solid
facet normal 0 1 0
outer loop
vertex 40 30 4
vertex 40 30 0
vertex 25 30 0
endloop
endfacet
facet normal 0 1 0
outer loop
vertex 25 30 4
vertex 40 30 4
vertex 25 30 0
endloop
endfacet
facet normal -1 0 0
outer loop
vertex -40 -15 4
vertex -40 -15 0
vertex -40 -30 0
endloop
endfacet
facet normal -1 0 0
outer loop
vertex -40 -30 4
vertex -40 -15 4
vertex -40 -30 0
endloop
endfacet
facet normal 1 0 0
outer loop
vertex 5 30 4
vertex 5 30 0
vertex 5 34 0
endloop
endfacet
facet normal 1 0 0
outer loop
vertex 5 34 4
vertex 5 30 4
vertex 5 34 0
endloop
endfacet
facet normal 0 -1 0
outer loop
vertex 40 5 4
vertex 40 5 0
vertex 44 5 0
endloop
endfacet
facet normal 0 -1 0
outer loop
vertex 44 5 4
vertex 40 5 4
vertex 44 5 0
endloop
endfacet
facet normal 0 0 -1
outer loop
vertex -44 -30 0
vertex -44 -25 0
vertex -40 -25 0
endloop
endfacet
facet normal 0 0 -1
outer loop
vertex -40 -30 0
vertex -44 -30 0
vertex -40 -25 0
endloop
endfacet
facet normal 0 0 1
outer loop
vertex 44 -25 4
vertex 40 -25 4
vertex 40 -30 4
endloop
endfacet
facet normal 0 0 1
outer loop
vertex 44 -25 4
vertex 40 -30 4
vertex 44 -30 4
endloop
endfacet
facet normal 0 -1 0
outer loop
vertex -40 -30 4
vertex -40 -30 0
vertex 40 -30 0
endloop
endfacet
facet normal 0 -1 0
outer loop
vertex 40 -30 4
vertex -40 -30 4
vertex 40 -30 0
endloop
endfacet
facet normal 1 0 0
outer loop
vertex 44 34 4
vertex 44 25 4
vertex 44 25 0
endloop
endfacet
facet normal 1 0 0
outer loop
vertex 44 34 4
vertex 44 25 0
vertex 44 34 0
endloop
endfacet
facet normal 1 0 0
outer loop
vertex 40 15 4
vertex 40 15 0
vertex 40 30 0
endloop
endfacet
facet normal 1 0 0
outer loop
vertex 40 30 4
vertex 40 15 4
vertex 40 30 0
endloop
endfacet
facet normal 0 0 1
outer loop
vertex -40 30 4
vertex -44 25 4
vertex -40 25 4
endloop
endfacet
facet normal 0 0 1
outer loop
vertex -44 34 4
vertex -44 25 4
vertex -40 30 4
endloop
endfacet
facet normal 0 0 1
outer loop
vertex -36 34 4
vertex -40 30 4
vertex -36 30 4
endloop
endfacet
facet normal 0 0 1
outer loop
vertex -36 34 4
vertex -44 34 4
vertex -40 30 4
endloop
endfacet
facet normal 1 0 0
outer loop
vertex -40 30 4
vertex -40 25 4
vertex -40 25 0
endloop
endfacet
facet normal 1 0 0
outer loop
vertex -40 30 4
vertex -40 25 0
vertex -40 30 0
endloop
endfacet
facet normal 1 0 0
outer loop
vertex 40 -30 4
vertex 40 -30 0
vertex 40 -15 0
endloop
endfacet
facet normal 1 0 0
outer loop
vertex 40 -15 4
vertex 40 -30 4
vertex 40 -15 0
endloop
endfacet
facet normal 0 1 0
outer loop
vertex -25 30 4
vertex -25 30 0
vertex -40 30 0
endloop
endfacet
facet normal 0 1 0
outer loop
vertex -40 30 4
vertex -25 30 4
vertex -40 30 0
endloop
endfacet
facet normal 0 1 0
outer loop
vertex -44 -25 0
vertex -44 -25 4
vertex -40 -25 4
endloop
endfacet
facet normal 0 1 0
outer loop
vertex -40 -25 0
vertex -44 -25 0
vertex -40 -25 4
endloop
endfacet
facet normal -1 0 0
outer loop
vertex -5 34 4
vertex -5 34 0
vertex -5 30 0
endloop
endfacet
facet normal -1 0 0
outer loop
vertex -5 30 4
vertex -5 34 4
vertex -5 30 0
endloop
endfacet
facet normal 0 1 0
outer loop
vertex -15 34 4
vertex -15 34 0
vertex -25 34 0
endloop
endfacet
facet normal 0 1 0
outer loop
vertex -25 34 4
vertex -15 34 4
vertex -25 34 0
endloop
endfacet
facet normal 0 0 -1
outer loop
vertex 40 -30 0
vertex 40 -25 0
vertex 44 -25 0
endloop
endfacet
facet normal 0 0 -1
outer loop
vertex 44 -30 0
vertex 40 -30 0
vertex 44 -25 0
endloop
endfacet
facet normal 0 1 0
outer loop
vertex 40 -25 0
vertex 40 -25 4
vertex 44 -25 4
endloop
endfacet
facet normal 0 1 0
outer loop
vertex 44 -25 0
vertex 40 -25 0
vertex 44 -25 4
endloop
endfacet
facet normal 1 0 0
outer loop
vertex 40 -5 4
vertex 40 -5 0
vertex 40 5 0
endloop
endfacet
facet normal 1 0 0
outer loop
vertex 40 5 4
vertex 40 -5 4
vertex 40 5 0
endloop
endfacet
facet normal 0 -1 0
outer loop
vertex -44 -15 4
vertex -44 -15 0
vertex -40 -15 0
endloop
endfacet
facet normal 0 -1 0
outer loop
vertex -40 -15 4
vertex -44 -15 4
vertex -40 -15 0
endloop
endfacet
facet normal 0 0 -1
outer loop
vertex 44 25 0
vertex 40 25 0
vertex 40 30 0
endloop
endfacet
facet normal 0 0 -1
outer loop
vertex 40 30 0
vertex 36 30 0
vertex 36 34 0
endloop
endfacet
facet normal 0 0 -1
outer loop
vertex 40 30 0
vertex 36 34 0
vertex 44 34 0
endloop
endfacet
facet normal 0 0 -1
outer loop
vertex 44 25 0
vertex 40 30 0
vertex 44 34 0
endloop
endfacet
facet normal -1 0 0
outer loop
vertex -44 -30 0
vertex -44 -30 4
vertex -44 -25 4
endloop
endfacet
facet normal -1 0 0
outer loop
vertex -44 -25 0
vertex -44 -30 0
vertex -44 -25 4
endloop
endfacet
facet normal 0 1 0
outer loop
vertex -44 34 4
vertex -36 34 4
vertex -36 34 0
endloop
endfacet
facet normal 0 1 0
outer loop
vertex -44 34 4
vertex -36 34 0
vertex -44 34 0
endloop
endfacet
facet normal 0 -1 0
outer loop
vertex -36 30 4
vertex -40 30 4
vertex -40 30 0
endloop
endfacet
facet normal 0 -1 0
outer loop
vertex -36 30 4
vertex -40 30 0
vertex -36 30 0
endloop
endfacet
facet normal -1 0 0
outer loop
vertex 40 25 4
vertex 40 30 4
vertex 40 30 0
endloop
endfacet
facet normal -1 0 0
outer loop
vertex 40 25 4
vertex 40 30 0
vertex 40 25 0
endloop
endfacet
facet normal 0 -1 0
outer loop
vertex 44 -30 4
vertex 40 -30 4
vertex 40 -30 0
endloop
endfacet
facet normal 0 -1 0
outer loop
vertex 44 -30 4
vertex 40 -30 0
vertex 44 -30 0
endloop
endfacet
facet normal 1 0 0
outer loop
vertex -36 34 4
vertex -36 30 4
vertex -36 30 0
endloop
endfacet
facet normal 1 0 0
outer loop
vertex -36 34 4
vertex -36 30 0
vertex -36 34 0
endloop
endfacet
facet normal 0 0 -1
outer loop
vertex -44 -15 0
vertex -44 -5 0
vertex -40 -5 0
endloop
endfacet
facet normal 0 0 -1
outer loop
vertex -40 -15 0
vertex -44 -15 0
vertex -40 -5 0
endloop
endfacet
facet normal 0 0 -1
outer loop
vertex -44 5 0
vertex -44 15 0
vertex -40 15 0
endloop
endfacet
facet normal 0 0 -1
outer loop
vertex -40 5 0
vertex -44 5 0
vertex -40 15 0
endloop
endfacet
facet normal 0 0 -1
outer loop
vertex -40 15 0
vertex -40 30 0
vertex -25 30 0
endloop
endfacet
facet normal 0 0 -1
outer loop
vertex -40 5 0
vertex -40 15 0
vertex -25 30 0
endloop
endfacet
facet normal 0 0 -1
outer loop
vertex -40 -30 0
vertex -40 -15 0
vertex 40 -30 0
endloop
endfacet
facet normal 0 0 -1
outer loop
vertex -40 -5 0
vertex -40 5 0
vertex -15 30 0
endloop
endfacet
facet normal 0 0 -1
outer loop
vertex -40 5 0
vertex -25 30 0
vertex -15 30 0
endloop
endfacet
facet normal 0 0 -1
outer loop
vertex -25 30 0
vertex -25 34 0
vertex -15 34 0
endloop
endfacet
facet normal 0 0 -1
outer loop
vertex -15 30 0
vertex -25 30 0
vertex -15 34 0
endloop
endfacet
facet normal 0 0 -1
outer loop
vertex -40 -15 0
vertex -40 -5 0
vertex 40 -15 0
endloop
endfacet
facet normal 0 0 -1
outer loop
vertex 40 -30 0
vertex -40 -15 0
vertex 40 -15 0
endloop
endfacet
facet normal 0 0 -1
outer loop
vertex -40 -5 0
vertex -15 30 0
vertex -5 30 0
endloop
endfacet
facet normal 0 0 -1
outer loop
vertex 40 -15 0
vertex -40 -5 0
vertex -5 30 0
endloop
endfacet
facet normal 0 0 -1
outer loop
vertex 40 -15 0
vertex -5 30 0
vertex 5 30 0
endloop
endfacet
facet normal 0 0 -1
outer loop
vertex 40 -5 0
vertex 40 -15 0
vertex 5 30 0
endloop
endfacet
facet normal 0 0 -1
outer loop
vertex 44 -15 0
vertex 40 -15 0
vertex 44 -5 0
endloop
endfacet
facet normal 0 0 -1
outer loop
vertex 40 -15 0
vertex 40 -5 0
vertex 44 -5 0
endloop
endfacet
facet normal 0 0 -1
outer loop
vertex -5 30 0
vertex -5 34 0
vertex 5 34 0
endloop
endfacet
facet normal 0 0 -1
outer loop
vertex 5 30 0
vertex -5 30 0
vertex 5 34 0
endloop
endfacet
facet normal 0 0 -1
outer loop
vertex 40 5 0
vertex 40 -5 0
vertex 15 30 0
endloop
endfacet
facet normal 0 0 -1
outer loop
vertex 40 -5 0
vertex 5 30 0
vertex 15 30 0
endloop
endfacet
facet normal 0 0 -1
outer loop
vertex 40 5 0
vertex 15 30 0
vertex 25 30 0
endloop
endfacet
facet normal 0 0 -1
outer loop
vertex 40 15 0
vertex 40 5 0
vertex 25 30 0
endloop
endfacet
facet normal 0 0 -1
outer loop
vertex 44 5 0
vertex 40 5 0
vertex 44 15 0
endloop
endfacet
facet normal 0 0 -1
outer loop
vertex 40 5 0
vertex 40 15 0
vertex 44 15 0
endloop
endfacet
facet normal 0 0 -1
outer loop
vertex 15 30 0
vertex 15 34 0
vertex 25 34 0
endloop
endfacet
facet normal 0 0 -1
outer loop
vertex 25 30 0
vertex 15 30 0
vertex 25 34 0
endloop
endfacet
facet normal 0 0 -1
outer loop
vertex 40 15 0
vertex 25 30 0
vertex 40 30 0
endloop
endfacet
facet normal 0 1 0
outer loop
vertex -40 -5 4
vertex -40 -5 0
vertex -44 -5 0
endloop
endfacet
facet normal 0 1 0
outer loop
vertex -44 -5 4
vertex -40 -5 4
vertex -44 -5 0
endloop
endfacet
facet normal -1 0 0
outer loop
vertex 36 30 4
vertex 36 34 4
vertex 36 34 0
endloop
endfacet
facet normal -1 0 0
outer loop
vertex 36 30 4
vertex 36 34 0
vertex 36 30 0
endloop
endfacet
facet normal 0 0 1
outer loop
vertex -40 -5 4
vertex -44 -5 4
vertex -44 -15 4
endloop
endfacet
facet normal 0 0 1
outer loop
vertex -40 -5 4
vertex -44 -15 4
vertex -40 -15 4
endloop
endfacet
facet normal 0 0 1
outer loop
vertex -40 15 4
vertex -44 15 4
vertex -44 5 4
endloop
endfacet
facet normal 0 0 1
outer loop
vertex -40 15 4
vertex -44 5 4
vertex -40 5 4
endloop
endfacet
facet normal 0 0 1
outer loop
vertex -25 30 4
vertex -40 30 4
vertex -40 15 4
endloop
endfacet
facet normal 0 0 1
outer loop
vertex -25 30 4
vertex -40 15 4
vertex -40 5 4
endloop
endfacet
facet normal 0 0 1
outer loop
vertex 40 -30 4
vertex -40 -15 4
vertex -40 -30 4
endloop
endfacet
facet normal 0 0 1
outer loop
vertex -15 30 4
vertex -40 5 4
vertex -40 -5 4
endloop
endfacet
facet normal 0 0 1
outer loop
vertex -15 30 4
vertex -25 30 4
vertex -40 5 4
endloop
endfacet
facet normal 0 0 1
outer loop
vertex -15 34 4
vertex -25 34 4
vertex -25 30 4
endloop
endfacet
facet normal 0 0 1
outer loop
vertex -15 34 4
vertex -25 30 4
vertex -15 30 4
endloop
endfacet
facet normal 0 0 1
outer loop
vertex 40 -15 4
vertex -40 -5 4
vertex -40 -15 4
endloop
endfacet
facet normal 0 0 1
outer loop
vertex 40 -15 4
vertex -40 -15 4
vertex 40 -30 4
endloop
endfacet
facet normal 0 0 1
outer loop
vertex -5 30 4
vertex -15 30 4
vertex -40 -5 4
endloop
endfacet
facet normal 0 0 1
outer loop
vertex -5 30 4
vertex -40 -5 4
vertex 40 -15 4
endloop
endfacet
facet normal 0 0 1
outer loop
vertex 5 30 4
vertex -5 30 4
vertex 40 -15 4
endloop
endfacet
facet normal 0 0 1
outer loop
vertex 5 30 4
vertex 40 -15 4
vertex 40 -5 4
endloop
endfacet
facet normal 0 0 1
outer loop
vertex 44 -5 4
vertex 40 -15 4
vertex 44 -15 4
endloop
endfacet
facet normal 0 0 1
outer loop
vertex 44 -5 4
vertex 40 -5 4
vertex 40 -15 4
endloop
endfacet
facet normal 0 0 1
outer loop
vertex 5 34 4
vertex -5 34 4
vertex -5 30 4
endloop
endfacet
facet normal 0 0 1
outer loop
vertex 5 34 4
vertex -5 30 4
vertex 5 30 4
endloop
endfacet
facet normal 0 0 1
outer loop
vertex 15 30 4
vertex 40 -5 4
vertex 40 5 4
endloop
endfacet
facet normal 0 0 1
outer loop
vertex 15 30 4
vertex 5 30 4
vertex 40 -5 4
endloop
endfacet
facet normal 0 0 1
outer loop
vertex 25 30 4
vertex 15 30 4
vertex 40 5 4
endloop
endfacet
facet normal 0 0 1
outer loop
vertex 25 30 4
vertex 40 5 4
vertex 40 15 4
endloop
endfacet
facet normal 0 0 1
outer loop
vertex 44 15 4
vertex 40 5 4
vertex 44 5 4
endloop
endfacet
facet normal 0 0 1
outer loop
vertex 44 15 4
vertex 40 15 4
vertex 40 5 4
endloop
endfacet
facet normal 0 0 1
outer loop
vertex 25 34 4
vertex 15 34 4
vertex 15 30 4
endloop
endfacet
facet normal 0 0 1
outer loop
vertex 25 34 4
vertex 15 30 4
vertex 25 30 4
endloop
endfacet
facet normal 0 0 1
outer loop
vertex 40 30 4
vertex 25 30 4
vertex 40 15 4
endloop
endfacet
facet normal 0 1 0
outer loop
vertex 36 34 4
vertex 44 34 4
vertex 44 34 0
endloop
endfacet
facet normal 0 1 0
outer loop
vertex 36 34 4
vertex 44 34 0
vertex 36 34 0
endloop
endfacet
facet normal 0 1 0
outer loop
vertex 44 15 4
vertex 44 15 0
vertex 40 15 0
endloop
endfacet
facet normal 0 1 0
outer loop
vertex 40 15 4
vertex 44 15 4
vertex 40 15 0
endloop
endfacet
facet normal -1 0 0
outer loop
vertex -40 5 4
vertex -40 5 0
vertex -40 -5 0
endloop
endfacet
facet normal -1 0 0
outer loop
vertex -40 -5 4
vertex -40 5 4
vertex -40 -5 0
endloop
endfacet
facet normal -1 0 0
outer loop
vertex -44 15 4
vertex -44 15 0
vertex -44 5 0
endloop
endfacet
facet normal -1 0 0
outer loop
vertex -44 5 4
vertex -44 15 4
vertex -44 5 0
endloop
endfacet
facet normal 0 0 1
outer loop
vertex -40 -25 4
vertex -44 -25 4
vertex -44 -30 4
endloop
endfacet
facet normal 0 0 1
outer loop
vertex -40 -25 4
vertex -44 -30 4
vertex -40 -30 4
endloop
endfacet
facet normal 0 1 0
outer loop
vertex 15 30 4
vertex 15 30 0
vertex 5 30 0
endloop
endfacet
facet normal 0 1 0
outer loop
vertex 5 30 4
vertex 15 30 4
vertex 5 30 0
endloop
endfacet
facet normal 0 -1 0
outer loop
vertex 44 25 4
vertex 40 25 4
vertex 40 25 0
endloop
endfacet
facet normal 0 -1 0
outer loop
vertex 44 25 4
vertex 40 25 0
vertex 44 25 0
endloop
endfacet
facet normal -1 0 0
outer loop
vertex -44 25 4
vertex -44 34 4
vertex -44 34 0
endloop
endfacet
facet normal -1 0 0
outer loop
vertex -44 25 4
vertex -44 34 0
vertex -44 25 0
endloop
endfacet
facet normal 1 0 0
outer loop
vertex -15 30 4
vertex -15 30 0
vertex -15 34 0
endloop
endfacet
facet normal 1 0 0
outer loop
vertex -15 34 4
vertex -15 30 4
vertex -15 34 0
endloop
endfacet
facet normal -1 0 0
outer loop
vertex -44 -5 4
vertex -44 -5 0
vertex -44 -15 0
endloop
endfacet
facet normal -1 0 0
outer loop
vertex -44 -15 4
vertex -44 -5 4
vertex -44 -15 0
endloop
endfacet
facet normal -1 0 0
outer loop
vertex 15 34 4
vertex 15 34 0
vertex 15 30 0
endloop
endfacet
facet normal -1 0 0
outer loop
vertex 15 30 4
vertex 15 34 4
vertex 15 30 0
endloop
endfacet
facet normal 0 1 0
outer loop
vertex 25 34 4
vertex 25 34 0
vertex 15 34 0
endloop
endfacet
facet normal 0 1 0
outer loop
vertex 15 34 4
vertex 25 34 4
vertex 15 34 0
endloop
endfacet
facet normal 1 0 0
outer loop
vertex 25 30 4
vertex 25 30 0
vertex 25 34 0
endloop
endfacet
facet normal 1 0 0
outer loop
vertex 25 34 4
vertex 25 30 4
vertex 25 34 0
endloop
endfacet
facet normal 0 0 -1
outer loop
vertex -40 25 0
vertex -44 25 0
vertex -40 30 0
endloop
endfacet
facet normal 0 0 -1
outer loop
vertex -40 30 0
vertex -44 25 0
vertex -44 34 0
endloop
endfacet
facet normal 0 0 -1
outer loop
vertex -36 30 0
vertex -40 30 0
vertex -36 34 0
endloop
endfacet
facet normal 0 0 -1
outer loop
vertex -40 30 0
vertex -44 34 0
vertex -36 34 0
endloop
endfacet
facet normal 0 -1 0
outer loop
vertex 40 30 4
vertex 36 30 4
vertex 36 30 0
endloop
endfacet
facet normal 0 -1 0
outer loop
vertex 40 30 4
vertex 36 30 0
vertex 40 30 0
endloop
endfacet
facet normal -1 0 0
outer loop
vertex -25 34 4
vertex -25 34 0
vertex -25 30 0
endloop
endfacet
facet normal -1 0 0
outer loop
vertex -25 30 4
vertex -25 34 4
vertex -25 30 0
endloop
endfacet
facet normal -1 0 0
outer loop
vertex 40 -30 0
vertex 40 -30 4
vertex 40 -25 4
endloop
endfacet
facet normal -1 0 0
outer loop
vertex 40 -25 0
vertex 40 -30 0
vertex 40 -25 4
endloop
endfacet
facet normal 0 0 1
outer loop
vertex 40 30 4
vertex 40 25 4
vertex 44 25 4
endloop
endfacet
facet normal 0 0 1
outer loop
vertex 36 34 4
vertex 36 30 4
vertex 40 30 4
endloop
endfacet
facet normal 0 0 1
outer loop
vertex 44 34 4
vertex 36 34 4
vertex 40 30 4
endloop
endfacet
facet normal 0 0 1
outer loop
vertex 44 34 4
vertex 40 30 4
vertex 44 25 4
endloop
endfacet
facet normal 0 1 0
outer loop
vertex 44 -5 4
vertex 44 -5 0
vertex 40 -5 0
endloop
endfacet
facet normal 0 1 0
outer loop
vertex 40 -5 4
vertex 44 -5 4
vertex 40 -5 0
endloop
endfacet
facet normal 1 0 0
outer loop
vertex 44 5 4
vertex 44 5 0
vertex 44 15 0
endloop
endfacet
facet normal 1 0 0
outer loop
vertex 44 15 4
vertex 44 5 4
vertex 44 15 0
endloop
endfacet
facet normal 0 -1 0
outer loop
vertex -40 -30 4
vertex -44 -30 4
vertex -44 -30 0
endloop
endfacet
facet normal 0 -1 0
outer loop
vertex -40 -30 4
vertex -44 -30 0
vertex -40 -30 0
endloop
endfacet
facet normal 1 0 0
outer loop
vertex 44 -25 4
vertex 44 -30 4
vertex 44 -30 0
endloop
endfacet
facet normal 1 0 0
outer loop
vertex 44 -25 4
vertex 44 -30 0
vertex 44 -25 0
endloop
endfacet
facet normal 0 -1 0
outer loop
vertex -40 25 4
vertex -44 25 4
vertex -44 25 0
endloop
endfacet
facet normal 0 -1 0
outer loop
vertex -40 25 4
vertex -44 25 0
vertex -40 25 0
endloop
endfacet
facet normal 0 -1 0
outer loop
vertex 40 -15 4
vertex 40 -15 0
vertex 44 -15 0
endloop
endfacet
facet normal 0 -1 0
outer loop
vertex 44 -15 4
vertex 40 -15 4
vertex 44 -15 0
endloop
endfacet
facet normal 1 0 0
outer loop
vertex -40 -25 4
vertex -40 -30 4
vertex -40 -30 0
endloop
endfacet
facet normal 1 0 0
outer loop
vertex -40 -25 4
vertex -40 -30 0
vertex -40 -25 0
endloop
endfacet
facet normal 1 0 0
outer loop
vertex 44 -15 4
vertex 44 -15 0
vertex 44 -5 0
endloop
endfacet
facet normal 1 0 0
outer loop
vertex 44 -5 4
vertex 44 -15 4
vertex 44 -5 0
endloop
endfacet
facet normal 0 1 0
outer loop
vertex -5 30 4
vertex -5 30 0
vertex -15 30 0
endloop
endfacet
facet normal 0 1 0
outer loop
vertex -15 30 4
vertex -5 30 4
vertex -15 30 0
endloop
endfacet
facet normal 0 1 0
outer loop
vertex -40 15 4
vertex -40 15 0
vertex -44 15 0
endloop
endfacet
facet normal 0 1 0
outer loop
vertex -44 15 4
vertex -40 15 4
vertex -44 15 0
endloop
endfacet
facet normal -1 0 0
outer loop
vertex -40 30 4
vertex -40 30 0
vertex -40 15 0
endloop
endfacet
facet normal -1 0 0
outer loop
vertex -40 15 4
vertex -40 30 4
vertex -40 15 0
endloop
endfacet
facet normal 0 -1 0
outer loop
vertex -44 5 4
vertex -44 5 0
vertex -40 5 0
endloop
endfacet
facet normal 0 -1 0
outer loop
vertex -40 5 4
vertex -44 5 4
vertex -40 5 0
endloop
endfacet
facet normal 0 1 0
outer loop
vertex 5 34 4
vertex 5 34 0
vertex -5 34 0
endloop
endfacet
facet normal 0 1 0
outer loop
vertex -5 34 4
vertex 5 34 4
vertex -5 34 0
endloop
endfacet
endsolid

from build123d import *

# Parameters (mm, degrees)
SKETCH1_W             = 4
SKETCH1_H             = 5
BOSS_EXTRUDE1_DEPTH   = 4
BOSS_EXTRUDE2_DEPTH   = 4
BOSS_EXTRUDE2_2_DEPTH = 4
SKETCH2_W             = 4
SKETCH2_H             = 5
BOSS_EXTRUDE2_3_DEPTH = 4
BOSS_EXTRUDE2_4_DEPTH = 4


with BuildPart() as part:
    # Sketch1 → Boss-Extrude1 (new body)
    with BuildSketch(Plane.XY):
        Polygon((-25, 30), (-36, 30), (-36, 25), (-40, 25), (-40, 15), (-36, 15), (-36, 5), (-40, 5), (-40, -5), (-36, -5), (-36, -15), (-40, -15), (-40, -25), (-36, -25), (-36, -30), (36, -30), (36, -25), (40, -25), (40, -15), (36, -15), (36, -5), (40, -5), (40, 5), (36, 5), (36, 15), (40, 15), (40, 25), (36, 25), (36, 30), (25, 30), (25, 26), (15, 26), (15, 30), (5, 30), (5, 26), (-5, 26), (-5, 30), (-15, 30), (-15, 26), (-25, 26), align=None)
        Polygon((-36, 15), (-40, 15), (-40, 10), (-40, 5), (-36, 5), align=None)
        Polygon((-40, 10), (-40, 15), (-44, 15), (-44, 5), (-40, 5), align=None)
        Polygon((-36, -5), (-40, -5), (-40, -10), (-40, -15), (-36, -15), align=None)
        Polygon((-40, -10), (-40, -5), (-44, -5), (-44, -15), (-40, -15), align=None)
        with Locations((-38, -27.5)):
            Rectangle(SKETCH1_W, SKETCH1_H)
        with Locations((38, -27.5)):
            Rectangle(SKETCH1_W, SKETCH1_H)
        Polygon((36, -15), (40, -15), (40, -10), (40, -5), (36, -5), align=None)
        Polygon((40, -10), (40, -15), (44, -15), (44, -5), (40, -5), align=None)
        Polygon((40, 10), (40, 15), (36, 15), (36, 5), (40, 5), align=None)
        Polygon((44, 15), (40, 15), (40, 10), (40, 5), (44, 5), align=None)
        with Locations((38, 27.5)):
            Rectangle(SKETCH1_W, SKETCH1_H)
        Polygon((20, 30), (15, 30), (15, 26), (25, 26), (25, 30), align=None)
        Polygon((15, 34), (15, 30), (20, 30), (25, 30), (25, 34), align=None)
        Polygon((0, 30), (-5, 30), (-5, 26), (5, 26), (5, 30), align=None)
        Polygon((-5, 34), (-5, 30), (0, 30), (5, 30), (5, 34), align=None)
        with Locations((-38, 27.5)):
            Rectangle(SKETCH1_W, SKETCH1_H)
        Polygon((-20, 30), (-25, 30), (-25, 26), (-15, 26), (-15, 30), align=None)
        Polygon((-25, 34), (-25, 30), (-20, 30), (-15, 30), (-15, 34), align=None)
    extrude(amount=BOSS_EXTRUDE1_DEPTH)


with BuildPart() as body_2:
    # Sketch2 → Boss-Extrude2 (new body)
    with BuildSketch(Plane.XY.offset(4)):
        Polygon((-44, 34), (-44, 25), (-40, 25), (-40, 30), (-36, 30), (-36, 34), align=None)
    extrude(amount=-BOSS_EXTRUDE2_DEPTH)


with BuildPart() as body_3:
    # Sketch2 → Boss-Extrude2 2 (new body)
    with BuildSketch(Plane.XY.offset(4)):
        Polygon((40, 30), (40, 25), (44, 25), (44, 34), (36, 34), (36, 30), align=None)
    extrude(amount=-BOSS_EXTRUDE2_2_DEPTH)


with BuildPart() as body_4:
    # Sketch2 → Boss-Extrude2 3 (new body)
    with BuildSketch(Plane.XY.offset(4)):
        with Locations((42, -27.5)):
            Rectangle(SKETCH2_W, SKETCH2_H)
    extrude(amount=-BOSS_EXTRUDE2_3_DEPTH)


with BuildPart() as body_5:
    # Sketch2 → Boss-Extrude2 4 (new body)
    with BuildSketch(Plane.XY.offset(4)):
        with Locations((-42, -27.5)):
            Rectangle(SKETCH2_W, SKETCH2_H)
    extrude(amount=-BOSS_EXTRUDE2_4_DEPTH)


solid = Compound([part.part, body_2.part, body_3.part, body_4.part, body_5.part])
